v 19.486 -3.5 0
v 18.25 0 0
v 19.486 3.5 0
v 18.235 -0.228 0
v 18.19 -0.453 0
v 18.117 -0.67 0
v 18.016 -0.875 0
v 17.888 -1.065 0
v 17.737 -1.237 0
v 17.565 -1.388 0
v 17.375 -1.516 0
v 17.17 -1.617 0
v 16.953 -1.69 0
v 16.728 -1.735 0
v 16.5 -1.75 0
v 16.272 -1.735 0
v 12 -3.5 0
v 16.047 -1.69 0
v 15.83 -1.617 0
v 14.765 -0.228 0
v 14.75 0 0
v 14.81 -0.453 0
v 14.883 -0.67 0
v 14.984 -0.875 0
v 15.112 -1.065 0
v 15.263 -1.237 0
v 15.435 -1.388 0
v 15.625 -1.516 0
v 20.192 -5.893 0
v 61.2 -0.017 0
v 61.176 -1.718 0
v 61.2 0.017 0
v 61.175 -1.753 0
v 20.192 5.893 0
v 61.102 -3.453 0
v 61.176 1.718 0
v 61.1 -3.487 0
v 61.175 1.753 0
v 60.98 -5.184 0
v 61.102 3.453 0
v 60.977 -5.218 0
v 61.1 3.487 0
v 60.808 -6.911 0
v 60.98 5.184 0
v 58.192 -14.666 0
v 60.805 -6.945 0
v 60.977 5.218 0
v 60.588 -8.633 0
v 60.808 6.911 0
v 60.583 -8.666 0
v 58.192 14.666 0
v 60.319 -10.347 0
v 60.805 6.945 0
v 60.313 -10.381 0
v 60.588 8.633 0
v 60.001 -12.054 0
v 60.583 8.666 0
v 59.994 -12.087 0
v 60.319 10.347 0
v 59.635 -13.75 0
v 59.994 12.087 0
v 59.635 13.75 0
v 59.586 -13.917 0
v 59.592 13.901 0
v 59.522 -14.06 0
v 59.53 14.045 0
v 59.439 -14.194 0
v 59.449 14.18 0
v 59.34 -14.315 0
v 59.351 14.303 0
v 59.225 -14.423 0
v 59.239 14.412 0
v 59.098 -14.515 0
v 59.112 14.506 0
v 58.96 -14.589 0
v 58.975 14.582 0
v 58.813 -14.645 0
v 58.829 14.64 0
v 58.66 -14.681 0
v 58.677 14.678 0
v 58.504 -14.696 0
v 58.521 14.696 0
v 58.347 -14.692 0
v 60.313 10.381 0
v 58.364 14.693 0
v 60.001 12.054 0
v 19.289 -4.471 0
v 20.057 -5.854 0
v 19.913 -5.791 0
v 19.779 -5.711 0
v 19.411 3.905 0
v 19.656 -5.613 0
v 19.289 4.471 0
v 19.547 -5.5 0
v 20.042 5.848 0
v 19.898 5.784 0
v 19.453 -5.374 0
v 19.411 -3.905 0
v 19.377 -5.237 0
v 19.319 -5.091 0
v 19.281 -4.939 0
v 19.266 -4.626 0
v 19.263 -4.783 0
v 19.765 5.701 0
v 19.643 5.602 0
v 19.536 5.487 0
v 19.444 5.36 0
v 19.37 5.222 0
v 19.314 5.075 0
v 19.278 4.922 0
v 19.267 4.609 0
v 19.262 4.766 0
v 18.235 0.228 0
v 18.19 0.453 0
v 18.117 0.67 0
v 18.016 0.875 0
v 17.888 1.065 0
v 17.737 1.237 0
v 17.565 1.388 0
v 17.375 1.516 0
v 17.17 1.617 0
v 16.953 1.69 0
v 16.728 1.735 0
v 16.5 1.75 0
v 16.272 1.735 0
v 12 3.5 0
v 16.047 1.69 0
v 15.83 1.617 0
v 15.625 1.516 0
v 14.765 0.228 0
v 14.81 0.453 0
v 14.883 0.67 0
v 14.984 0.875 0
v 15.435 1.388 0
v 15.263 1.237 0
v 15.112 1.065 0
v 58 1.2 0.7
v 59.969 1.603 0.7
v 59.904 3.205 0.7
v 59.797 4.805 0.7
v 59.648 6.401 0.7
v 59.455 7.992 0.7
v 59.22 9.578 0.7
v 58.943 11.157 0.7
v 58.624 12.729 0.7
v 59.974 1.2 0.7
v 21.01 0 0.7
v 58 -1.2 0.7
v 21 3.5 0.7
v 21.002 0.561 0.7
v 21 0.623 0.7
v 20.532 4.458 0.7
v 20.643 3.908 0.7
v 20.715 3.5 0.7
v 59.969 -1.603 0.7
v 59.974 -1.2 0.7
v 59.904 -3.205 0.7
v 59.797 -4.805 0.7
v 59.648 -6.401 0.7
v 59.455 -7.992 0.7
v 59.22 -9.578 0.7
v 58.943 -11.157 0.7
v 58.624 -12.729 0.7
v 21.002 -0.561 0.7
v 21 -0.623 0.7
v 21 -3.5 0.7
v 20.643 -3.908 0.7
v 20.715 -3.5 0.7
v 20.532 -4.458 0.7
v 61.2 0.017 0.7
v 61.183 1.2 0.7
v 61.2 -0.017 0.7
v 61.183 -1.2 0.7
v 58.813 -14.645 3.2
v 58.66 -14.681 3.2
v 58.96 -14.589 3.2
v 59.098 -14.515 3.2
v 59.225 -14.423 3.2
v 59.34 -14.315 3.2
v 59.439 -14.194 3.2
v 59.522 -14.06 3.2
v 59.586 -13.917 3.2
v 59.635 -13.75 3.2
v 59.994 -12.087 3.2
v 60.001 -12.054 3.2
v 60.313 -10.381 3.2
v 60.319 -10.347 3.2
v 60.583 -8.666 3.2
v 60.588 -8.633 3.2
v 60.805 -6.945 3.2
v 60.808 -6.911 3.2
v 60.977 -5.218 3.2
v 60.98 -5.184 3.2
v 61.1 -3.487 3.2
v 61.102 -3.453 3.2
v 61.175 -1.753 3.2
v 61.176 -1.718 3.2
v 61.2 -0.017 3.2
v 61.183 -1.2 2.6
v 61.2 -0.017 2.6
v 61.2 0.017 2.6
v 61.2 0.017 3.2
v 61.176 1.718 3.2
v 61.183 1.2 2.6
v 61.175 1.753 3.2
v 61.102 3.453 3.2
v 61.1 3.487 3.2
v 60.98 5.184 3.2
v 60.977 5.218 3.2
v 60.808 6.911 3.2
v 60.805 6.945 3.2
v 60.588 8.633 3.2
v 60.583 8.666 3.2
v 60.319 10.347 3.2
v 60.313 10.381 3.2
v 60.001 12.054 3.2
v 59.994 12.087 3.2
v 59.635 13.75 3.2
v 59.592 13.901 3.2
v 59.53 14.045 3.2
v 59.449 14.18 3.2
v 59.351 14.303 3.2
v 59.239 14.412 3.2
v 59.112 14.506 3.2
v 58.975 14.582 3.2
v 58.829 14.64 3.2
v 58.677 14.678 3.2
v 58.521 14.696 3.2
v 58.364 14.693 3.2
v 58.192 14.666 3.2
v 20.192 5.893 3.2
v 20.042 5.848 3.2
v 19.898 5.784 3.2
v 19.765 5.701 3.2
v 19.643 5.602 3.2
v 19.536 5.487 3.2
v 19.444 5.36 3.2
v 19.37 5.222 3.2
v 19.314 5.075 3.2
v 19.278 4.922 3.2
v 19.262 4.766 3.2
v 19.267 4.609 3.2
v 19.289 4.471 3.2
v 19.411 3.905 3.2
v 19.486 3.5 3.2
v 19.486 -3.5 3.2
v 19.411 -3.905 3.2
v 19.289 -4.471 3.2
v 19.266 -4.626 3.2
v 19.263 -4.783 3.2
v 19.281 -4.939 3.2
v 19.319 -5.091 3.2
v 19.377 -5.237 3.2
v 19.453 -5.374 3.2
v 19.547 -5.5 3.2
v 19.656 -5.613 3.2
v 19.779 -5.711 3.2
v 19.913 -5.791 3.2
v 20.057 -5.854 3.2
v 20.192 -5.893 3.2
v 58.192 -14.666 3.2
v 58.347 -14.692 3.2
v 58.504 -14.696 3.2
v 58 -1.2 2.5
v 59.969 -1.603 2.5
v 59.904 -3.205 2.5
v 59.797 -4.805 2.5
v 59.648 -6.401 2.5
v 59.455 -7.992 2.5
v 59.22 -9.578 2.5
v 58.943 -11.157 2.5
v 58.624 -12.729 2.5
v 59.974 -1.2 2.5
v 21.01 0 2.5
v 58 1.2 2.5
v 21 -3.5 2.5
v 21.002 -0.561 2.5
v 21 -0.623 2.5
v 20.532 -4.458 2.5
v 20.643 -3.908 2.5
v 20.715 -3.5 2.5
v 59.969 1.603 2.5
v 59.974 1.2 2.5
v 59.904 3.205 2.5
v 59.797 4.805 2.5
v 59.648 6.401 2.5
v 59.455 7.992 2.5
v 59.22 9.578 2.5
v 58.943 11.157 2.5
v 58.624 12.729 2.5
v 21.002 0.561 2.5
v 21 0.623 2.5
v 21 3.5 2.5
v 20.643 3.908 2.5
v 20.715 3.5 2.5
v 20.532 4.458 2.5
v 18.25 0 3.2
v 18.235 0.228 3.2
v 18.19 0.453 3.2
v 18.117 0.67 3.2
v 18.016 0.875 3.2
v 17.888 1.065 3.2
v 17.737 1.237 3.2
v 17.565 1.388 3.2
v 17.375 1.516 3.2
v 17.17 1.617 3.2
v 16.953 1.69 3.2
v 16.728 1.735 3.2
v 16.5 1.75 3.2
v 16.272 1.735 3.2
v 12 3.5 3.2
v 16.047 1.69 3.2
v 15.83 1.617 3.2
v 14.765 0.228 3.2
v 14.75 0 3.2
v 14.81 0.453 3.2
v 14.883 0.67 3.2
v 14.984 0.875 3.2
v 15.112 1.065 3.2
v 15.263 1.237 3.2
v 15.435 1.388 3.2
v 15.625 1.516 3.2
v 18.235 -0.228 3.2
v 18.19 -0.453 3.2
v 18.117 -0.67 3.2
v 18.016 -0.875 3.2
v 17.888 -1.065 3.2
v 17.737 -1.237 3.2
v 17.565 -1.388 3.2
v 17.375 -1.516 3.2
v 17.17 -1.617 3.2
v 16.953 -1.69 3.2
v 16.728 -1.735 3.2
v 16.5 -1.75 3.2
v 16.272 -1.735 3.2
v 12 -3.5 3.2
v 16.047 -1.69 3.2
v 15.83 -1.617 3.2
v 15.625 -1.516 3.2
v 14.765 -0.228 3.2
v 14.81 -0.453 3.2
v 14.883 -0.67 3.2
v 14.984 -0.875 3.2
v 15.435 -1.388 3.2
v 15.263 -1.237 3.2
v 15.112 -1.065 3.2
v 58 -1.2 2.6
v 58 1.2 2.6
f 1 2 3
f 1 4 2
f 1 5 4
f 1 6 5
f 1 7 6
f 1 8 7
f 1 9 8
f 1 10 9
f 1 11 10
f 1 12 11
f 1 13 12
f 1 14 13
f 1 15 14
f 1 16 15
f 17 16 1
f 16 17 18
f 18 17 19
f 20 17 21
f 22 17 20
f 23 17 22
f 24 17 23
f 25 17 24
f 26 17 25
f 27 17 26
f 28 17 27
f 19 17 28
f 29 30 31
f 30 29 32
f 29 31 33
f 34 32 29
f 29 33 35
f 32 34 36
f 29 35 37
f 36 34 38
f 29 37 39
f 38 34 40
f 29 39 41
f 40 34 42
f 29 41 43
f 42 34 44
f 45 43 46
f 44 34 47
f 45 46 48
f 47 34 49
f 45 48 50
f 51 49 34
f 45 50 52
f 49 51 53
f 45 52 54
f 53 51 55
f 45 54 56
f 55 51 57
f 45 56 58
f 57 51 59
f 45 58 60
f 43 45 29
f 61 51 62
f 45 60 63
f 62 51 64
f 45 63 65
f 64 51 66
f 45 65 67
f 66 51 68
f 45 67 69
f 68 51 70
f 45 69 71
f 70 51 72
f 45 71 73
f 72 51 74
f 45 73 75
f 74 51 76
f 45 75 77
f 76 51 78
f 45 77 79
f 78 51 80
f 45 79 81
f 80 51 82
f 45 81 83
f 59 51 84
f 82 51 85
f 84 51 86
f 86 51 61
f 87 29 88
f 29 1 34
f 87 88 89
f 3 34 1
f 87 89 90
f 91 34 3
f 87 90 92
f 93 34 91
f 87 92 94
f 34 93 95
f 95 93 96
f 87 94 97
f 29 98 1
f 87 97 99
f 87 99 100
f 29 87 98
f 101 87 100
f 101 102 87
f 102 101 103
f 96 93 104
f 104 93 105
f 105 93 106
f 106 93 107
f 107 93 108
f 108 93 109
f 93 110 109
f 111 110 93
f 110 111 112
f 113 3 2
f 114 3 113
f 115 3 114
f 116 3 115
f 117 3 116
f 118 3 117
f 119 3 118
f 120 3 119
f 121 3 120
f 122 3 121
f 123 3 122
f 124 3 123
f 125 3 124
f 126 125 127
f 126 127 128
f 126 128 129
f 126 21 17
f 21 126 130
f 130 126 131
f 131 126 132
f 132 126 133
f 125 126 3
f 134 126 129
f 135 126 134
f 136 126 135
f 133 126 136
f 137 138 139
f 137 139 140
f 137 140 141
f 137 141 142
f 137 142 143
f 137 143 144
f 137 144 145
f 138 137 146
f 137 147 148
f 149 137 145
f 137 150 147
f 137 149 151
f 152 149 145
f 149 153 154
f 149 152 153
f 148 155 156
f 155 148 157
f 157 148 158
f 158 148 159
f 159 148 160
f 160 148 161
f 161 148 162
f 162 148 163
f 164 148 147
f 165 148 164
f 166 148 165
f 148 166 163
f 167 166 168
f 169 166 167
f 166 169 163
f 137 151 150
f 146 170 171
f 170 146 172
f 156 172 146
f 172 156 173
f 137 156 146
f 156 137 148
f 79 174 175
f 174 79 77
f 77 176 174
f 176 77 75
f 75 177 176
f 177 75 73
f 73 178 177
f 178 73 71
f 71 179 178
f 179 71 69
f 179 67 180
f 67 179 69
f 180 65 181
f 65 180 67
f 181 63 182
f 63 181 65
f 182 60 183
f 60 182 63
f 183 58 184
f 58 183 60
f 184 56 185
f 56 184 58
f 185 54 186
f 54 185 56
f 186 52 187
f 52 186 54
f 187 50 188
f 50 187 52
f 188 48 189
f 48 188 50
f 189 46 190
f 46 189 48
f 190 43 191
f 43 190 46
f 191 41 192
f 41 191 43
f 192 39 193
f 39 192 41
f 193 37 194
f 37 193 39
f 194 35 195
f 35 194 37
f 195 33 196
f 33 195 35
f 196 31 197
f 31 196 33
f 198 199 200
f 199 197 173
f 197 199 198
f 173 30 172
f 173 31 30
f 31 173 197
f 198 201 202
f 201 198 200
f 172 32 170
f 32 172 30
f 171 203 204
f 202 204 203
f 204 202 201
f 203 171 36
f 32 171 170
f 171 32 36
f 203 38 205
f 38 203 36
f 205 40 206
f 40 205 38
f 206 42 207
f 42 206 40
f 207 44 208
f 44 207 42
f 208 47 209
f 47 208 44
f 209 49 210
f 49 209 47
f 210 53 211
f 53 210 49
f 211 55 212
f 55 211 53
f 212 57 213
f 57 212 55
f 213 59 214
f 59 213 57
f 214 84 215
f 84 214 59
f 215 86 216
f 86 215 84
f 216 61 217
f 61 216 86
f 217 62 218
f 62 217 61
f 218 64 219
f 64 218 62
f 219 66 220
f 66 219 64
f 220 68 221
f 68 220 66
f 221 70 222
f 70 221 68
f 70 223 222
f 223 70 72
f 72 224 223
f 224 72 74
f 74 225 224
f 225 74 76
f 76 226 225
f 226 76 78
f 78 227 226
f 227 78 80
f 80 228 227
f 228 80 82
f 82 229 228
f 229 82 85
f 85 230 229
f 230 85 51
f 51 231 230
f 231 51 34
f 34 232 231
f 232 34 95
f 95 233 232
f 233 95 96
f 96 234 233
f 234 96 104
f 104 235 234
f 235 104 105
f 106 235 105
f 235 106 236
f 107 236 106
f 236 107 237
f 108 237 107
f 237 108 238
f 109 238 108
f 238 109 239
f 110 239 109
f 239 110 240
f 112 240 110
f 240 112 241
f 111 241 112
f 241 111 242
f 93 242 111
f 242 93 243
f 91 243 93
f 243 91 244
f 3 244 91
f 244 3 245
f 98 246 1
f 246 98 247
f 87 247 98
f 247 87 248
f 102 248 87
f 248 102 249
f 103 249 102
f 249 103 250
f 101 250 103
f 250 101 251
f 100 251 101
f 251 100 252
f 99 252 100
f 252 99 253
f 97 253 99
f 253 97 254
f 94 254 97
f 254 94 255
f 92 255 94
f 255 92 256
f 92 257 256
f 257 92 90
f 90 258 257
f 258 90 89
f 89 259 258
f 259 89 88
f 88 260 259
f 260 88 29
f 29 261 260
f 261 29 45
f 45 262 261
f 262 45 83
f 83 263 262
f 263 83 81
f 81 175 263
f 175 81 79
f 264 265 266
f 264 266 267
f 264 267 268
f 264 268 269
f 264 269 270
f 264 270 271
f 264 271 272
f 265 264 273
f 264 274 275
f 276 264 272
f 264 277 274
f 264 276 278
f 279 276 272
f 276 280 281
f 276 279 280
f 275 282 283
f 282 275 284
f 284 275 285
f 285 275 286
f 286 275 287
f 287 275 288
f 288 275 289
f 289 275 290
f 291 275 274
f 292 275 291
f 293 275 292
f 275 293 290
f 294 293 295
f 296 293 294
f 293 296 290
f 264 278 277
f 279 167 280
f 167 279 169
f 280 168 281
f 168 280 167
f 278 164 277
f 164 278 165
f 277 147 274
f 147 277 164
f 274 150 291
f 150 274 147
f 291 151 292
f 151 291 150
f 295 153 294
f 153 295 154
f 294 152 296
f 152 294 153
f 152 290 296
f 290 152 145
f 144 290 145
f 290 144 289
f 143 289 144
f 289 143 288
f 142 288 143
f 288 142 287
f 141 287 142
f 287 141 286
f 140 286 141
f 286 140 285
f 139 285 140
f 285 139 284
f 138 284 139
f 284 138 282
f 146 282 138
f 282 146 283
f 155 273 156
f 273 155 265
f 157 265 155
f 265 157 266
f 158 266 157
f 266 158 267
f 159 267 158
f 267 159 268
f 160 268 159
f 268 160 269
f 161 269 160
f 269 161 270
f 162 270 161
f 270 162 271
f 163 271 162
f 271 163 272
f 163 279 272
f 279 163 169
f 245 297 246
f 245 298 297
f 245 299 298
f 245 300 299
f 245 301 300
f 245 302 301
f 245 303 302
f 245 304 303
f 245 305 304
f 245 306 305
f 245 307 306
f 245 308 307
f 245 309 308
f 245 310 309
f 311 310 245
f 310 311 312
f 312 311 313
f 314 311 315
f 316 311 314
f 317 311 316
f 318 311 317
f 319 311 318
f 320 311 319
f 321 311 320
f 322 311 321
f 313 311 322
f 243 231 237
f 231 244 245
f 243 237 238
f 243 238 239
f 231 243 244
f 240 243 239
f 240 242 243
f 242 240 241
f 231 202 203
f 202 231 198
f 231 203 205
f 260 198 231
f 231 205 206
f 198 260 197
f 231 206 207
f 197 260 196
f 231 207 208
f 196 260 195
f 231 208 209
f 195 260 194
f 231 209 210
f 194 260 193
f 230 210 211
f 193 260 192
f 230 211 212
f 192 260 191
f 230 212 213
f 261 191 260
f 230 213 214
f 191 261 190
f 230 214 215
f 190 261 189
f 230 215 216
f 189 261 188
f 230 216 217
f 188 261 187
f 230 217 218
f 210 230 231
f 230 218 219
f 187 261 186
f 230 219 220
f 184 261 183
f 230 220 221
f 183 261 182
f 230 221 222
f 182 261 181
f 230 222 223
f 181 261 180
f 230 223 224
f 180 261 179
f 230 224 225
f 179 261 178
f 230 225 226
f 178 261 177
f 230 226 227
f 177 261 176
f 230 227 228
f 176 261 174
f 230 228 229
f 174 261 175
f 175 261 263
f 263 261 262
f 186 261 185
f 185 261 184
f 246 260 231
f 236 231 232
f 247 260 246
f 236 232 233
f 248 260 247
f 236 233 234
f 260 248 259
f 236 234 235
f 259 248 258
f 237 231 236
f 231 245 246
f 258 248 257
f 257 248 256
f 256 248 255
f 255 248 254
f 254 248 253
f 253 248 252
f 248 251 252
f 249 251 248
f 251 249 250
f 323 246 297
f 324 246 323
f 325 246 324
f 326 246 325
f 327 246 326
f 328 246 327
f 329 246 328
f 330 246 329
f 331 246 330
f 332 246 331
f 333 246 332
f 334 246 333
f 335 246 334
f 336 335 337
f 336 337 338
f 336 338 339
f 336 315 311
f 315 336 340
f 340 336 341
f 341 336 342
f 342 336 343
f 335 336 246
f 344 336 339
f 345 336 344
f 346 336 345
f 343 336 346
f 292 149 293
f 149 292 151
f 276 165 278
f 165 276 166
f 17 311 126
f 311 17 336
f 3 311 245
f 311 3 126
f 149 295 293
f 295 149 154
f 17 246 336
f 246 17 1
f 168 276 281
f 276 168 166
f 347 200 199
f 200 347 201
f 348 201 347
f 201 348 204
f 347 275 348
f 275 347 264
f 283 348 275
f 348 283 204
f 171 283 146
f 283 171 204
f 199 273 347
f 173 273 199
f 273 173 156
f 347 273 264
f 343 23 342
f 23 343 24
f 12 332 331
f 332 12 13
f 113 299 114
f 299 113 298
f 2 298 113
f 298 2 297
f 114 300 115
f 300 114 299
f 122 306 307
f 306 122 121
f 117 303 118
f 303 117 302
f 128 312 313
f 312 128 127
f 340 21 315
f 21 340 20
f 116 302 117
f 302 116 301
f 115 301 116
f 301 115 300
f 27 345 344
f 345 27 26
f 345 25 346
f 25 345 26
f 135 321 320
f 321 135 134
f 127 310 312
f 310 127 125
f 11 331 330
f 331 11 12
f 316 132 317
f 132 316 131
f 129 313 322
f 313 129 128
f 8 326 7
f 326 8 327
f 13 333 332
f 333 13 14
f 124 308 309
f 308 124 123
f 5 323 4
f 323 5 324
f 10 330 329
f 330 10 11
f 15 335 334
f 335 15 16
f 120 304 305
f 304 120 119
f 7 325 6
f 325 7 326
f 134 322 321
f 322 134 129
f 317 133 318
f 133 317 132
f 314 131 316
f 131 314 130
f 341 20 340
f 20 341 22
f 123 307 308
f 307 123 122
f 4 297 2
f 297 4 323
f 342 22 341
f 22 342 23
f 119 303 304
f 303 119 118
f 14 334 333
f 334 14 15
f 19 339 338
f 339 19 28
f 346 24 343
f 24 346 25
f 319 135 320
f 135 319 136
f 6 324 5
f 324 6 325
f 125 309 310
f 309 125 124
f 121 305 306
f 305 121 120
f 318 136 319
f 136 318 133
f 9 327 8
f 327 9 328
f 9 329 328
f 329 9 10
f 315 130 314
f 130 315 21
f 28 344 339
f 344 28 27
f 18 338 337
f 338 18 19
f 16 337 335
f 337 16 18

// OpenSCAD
// file: parameters.scad
// =============================================================================
// Gen-Y Dual-rotor MICRO-GAP copper-window AFPM — WOUND-AWARE (HARD GATE)
// PRIMARY challenger vs Gen-V. Thinner m2m + larger copper window + 150 t.
// =============================================================================

// --- Wire / wind budget (26 AWG, ~1 lb spool ≈ 390 m bare-equiv) --------------
wire_awg            = 26;
wire_od             = 0.45;     // insulated OD mm
turns               = 150;      // +10 vs Gen-V
fill                = 0.70;
layers_per_face     = 2;        // axial layers proud of EACH flange
wind_build_axial    = layers_per_face * wire_od * fill;   // 0.63 mm
wind_build_radial   = 3 * wire_od * fill;                 // 0.945 mm

// --- Pancake former (bare STL) — thinner web/flange than Gen-V ---------------
coil_id_r           = 21.0;     // larger copper window vs Gen-V 23–58
coil_od_r           = 60.0;
span_deg            = 26.0;     // 12 stations × 30° pitch
former_web          = 1.8;
flange_t            = 0.70;
wall                = 1.2;
slot_w              = 2.4;
mount_hole          = 3.5;
tab_len             = 7.0;

former_bare_h       = former_web + 2 * flange_t;            // 3.2 mm
coil_envelope_h     = former_bare_h + 2 * wind_build_axial; // 4.46 mm

// --- Running clearance (magnet face → WOUND face) EACH side ------------------
run_clear           = 0.65;     // PASS ≥ 0.5 (prefer ≥0.65)
gap_spacer_h        = run_clear + wind_build_axial;         // 1.28 mm
m2m                 = coil_envelope_h + 2 * run_clear;      // 5.76 mm (beats Gen-V 6.16)

// --- Mid stator (12 pancakes 3φ; winds proud both faces) ---------------------
coil_stations       = 12;
bay_r_in            = coil_id_r - 2.0 - wind_build_radial;
bay_r_out           = coil_od_r + 2.0 + wind_build_radial;
bay_span            = span_deg + 4.0;
bay_offset          = 2.0;
stator_thick        = former_bare_h;                        // winds proud ±Z
stator_od           = 156.0;
shaft_clear_stator  = 36.0;
coil_mount_r        = 28.0;

// --- Rotors (×2) — 8×Ø20 + 24×Ø5 Halbach each face ---------------------------
large_pocket_d      = 20.3;
small_pocket_d      = 5.3;
pocket_h            = 5.2;
large_n             = 8;
R_large             = 52.0;
R_small_inner       = 40.0;
R_small_mid         = 52.0;
R_small_outer       = 64.0;
carrier_od          = 152.0;
carrier_thick       = 7.5;
hub_h               = 10.0;
hub_od              = 30.0;
rotor_b_offset_deg  = 22.5;

// --- Modular MAX interface (Gen-E family) ------------------------------------
shaft_bore          = 8.35;
bearing_d           = 21.85;
bearing_h           = 7.2;
m3_clear            = 3.5;
bolt_r_inner        = 36.0;
bolt_n_inner        = 6;
flange_bolt_r       = 72.0;
flange_bolt_n       = 6;
brace_r             = 68.0;
brace_d             = 4.3;
brace_n             = 4;

spacer_pad_od       = 14.0;
spacer_pad_id       = m3_clear;
endbell_od          = 156.0;
endbell_thick       = 8.0;
endbell_shaft_clear = 10.0;

$fn = 64;
// main file
// Gen-Y pancake former — print ×12
// WOUND: wind_build_axial computed in parameters.scad; wind BEFORE assembly
include <parameters.scad>;
$fn = 48;

module sector_2d(r_in, r_out, ang) {
    polygon([
        for (a = [-ang/2 : ang/16 : ang/2]) [r_in*cos(a), r_in*sin(a)],
        for (a = [ang/2 : -ang/16 : -ang/2]) [r_out*cos(a), r_out*sin(a)]
    ]);
}
module flange() {
    linear_extrude(flange_t) offset(r=wall) sector_2d(coil_id_r, coil_od_r, span_deg);
}
difference() {
    union() {
        flange();
        translate([0, 0, flange_t])
            linear_extrude(former_web)
                difference() {
                    offset(r=wall) sector_2d(coil_id_r, coil_od_r, span_deg);
                    sector_2d(coil_id_r + 0.01, coil_od_r - 0.01, span_deg - 1.5);
                }
        translate([0, 0, flange_t + former_web]) flange();
        translate([coil_id_r - tab_len - 2, -3.5, 0])
            cube([tab_len + 2, 7, former_bare_h]);
    }
    translate([coil_od_r - 2, -slot_w/2, flange_t])
        cube([wall + 4, slot_w, former_web + 0.1]);
    translate([coil_id_r - tab_len/2 - 1, 0, -0.1])
        cylinder(d=mount_hole, h=former_bare_h + 1);
}
